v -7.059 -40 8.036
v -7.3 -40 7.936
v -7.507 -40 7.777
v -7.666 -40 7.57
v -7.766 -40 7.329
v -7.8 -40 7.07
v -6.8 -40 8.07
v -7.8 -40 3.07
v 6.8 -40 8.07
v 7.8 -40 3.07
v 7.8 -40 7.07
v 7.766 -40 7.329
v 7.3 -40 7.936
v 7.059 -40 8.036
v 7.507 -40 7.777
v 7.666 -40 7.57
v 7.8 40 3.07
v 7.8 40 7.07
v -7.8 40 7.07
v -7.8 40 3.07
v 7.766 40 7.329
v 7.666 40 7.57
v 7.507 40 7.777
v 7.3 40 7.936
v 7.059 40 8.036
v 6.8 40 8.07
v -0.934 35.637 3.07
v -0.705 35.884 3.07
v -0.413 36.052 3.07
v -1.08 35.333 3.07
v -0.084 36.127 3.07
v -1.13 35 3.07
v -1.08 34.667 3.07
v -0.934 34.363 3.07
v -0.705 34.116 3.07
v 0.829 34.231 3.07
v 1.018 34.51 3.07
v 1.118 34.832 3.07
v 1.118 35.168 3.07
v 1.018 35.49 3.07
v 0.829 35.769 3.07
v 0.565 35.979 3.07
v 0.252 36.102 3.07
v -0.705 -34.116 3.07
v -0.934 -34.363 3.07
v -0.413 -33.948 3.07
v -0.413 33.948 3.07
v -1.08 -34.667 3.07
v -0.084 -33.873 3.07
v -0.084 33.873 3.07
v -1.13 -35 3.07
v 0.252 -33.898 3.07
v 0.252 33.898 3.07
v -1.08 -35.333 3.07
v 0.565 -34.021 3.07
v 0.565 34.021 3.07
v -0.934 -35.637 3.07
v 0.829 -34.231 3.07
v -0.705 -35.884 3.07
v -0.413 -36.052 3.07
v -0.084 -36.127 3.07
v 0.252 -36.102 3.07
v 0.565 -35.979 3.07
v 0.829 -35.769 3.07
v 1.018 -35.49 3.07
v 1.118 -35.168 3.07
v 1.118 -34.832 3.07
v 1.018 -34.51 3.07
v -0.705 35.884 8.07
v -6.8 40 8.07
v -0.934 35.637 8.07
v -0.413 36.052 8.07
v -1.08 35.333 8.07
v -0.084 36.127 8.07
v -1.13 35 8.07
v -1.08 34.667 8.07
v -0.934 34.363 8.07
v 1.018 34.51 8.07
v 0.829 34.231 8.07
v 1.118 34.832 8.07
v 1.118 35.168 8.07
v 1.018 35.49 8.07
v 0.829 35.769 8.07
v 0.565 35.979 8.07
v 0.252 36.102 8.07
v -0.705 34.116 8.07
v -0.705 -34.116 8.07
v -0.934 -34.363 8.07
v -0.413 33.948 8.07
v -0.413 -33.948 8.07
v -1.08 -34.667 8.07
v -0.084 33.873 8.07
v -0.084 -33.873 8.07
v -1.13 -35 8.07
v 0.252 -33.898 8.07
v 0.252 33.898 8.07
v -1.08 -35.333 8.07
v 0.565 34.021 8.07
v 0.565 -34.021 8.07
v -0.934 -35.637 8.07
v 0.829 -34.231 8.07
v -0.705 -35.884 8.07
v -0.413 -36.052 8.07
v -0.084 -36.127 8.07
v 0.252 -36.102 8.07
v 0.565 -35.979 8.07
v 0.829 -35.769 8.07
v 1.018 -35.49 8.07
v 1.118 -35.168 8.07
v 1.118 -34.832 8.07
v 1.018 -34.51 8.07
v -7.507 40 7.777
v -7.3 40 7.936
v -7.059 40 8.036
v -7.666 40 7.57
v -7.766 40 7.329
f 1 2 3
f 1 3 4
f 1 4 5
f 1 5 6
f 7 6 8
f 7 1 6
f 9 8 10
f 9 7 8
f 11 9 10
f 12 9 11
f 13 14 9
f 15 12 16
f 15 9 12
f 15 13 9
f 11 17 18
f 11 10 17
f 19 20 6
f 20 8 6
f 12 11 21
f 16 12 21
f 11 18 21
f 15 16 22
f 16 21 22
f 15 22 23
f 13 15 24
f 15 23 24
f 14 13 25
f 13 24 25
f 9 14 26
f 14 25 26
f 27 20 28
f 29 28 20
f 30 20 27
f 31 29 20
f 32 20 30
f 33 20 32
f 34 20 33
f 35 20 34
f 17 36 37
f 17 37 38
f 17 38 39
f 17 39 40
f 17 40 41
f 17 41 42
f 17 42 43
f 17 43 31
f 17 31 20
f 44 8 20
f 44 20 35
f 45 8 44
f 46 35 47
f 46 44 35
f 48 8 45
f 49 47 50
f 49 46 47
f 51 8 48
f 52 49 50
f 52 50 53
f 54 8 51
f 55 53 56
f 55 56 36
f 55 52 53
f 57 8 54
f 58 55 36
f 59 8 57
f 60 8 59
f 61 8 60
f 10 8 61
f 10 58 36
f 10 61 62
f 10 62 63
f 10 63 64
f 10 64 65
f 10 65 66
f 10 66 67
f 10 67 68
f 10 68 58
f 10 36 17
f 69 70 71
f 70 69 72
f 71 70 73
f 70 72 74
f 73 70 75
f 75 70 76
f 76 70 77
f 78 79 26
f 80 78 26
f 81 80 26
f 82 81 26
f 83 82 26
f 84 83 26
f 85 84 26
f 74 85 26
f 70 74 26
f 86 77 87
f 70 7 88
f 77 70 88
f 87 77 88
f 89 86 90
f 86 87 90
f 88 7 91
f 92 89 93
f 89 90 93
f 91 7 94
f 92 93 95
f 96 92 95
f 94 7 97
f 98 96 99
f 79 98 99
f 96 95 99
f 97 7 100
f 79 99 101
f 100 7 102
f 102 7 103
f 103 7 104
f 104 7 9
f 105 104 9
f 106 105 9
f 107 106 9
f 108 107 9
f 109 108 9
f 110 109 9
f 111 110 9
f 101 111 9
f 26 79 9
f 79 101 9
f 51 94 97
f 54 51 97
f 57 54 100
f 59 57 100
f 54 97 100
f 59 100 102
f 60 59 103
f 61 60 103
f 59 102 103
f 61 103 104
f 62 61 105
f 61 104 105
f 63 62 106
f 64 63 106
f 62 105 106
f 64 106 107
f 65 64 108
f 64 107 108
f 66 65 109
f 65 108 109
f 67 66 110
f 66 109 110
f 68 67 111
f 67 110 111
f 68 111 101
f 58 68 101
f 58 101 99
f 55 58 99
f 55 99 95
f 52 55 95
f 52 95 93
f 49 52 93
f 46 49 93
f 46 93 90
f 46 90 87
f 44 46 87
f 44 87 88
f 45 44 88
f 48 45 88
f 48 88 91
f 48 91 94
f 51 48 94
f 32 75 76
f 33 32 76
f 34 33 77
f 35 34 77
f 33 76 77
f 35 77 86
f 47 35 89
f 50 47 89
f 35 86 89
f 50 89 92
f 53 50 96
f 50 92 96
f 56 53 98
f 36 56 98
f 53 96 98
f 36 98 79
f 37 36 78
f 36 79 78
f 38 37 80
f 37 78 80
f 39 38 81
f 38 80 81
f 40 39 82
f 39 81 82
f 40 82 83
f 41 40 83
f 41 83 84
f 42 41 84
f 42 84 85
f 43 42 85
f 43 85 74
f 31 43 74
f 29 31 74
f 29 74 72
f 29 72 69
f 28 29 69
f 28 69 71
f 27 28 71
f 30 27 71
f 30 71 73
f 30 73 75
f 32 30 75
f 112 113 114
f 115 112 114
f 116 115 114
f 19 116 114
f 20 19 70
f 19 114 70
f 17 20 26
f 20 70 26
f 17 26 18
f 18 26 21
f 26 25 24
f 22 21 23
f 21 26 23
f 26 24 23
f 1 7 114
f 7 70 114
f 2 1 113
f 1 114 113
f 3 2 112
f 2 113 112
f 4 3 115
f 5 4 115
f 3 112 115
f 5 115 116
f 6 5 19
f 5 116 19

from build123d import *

# Parameters (mm, degrees)
F0_W     = 15.6
F0_H     = 5
F1_DEPTH = 40
F2_R     = 1
F3_R     = 1
F8_D     = 2.2606
F10_D    = 2.2606


# Not quite as in the source:
# - a feature of the source that left no trace in its solid (it failed there, or was rolled back) is left out


with BuildPart() as f1:
    # F0 (on Front) → F1 (new body, symmetric)
    with BuildSketch(Plane.XZ):
        with Locations((0, 5.57)):
            Rectangle(F0_W, F0_H)
    extrude(amount=F1_DEPTH, both=True)

    # F2
    f2_edges = [f1.edges().sort_by_distance(p)[0] for p in [
        (7.8, 0, 8.07),
    ]]
    fillet(f2_edges, radius=F2_R)

    # F3
    f3_edges = [f1.edges().sort_by_distance(p)[0] for p in [
        (-7.8, 0, 8.07),
    ]]
    fillet(f3_edges, radius=F3_R)

    # F8 (through all)
    with Locations(Plane(origin=(0, 0, 0), x_dir=(1, 0, 0), z_dir=(0, 0, -1))):
        with Locations((0, 35)):
            Hole(F8_D / 2)

    # F10 (through all)
    with Locations(Plane(origin=(0, 0, 0), x_dir=(1, 0, 0), z_dir=(0, 0, -1))):
        with Locations((0, -35)):
            Hole(F10_D / 2)


solid = f1.part
